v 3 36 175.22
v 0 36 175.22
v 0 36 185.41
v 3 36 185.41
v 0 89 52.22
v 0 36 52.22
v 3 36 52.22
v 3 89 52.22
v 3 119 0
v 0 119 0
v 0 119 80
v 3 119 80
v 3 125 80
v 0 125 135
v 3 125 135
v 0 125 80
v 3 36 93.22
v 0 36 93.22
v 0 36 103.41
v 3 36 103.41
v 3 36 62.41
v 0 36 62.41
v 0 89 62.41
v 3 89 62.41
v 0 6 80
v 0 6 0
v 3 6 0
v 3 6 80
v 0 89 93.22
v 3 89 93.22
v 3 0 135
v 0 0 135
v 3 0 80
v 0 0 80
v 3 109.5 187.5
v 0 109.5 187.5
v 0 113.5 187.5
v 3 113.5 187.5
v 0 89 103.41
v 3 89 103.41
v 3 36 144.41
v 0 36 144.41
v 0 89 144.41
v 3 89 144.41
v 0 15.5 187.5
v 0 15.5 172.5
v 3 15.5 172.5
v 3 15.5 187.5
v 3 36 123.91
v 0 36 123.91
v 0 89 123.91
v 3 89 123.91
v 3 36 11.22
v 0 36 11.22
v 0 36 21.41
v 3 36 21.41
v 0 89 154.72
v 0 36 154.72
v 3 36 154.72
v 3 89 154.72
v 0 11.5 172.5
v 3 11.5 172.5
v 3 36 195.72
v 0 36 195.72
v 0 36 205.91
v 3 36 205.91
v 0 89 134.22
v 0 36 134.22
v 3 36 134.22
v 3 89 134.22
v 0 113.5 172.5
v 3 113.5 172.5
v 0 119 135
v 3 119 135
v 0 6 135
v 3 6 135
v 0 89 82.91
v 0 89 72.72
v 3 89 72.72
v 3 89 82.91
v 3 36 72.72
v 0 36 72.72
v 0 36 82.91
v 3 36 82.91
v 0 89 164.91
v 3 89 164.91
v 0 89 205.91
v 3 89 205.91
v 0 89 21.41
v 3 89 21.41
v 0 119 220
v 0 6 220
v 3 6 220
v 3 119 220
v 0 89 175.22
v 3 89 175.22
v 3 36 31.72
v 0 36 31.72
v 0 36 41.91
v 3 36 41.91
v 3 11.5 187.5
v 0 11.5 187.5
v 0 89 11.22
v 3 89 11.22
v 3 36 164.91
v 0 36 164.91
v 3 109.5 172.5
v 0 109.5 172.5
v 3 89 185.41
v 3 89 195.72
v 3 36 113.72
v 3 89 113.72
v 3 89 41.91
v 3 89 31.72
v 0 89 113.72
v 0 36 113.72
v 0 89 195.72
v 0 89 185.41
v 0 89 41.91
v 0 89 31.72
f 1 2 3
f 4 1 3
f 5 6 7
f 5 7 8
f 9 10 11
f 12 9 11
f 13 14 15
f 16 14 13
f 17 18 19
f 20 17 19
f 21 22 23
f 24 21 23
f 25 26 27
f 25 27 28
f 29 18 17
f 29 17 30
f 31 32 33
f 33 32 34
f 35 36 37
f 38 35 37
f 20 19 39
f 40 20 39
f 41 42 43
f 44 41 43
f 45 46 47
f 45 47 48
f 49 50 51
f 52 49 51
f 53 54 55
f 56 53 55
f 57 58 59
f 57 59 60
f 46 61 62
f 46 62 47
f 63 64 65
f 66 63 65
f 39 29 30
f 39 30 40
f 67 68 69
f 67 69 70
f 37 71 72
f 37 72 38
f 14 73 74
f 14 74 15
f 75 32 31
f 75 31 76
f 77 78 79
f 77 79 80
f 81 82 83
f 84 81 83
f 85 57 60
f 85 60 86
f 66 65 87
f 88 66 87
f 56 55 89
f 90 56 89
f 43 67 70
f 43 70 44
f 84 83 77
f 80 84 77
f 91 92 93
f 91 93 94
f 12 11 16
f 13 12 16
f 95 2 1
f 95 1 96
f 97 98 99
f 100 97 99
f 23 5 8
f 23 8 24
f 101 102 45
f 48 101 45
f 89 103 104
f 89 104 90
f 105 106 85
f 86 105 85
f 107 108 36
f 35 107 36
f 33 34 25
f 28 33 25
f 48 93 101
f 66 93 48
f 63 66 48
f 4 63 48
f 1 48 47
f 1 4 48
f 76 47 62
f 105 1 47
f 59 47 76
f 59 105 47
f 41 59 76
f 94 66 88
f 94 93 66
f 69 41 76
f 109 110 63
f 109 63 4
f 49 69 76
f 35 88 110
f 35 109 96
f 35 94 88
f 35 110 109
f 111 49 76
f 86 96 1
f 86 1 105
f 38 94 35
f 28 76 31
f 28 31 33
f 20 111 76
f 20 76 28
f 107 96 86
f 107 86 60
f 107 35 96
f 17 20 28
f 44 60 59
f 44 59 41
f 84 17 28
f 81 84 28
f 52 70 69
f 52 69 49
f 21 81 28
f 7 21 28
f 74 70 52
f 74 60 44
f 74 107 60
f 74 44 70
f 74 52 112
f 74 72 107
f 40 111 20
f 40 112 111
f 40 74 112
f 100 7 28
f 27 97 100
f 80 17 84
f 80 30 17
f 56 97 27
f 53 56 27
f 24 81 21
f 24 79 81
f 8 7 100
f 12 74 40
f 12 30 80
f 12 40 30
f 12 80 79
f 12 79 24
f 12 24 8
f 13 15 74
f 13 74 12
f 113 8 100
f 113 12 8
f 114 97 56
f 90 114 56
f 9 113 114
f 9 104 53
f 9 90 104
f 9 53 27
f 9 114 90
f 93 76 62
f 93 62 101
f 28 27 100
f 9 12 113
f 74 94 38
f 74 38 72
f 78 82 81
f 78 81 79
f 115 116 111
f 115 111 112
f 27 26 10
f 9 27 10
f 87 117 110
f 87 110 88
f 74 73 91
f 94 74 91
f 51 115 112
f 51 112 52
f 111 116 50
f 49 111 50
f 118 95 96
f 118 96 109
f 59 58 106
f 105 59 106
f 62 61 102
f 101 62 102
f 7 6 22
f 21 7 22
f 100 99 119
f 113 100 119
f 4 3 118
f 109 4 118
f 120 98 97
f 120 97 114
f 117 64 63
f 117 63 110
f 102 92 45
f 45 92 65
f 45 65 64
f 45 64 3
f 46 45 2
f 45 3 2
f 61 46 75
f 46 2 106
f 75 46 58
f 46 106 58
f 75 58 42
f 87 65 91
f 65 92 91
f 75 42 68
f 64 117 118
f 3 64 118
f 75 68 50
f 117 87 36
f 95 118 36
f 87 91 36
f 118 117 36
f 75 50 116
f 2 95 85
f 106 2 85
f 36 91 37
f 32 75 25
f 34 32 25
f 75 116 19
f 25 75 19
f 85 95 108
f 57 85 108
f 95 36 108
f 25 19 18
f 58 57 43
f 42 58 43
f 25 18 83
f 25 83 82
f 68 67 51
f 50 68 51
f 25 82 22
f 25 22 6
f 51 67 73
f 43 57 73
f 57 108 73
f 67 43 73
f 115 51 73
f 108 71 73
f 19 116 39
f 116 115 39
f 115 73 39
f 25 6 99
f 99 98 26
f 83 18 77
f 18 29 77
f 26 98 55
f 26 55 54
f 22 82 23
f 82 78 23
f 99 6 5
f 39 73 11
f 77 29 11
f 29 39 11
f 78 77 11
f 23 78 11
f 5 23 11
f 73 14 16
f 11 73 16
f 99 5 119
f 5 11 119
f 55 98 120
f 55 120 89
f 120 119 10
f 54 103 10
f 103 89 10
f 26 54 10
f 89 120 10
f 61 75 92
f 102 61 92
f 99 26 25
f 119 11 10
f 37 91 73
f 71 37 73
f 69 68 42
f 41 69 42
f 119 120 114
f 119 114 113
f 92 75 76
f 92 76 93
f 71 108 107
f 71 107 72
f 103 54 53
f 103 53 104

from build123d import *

# Parameters (mm, degrees)
SKETCH2_W           = 220
SKETCH2_H           = 125
BOSS_EXTRUDE1_DEPTH = 3
SKETCH3_W           = 80
SKETCH3_H           = 6
SKETCH3_W_2         = 85
CUT_EXTRUDE1_DEPTH  = 3
SKETCH4_W           = 10.189923803
SKETCH4_H           = 53
CUT_EXTRUDE2_DEPTH  = 3
SKETCH6_W           = 15
SKETCH6_H           = 4
CUT_EXTRUDE3_DEPTH  = 10


with BuildPart() as part:
    # Sketch2 → Boss-Extrude1 (new body)
    with BuildSketch(Plane(origin=(0, 0, 0), x_dir=(0, 0, -1), z_dir=(1, 0, 0))):
        with Locations((-110, 62.5)):
            Rectangle(SKETCH2_W, SKETCH2_H)
    extrude(amount=BOSS_EXTRUDE1_DEPTH)

    # Sketch3 → Cut-Extrude1 (cut)
    with BuildSketch(Plane.ZY):
        with Locations((40, 122)):
            Rectangle(SKETCH3_W, SKETCH3_H)
        with Locations((40, 3)):
            Rectangle(SKETCH3_W, SKETCH3_H)
        with Locations((177.5, 122)):
            Rectangle(SKETCH3_W_2, SKETCH3_H)
        with Locations((177.5, 3)):
            Rectangle(SKETCH3_W_2, SKETCH3_H)
    extrude(amount=-CUT_EXTRUDE1_DEPTH, mode=Mode.SUBTRACT)

    # Sketch4 → Cut-Extrude2 (cut)
    with BuildSketch(Plane.ZY):
        with Locations((16.315088301, 62.5)):
            Rectangle(SKETCH4_W, SKETCH4_H)
        with Locations((36.815088301, 62.5)):
            Rectangle(SKETCH4_W, SKETCH4_H)
        with Locations((57.315088301, 62.5)):
            Rectangle(SKETCH4_W, SKETCH4_H)
        with Locations((77.815088301, 62.5)):
            Rectangle(SKETCH4_W, SKETCH4_H)
        with Locations((98.315088301, 62.5)):
            Rectangle(SKETCH4_W, SKETCH4_H)
        with Locations((118.815088301, 62.5)):
            Rectangle(SKETCH4_W, SKETCH4_H)
        with Locations((139.315088301, 62.5)):
            Rectangle(SKETCH4_W, SKETCH4_H)
        with Locations((159.815088301, 62.5)):
            Rectangle(SKETCH4_W, SKETCH4_H)
        with Locations((180.315088301, 62.5)):
            Rectangle(SKETCH4_W, SKETCH4_H)
        with Locations((200.815088301, 62.5)):
            Rectangle(SKETCH4_W, SKETCH4_H)
    extrude(amount=-CUT_EXTRUDE2_DEPTH, mode=Mode.SUBTRACT)

    # Sketch6 → Cut-Extrude3 (cut)
    with BuildSketch(Plane.ZY):
        with Locations((180, 111.5)):
            Rectangle(SKETCH6_W, SKETCH6_H)
        with Locations((180, 13.5)):
            Rectangle(SKETCH6_W, SKETCH6_H)
    extrude(amount=-CUT_EXTRUDE3_DEPTH, mode=Mode.SUBTRACT)


solid = part.part
